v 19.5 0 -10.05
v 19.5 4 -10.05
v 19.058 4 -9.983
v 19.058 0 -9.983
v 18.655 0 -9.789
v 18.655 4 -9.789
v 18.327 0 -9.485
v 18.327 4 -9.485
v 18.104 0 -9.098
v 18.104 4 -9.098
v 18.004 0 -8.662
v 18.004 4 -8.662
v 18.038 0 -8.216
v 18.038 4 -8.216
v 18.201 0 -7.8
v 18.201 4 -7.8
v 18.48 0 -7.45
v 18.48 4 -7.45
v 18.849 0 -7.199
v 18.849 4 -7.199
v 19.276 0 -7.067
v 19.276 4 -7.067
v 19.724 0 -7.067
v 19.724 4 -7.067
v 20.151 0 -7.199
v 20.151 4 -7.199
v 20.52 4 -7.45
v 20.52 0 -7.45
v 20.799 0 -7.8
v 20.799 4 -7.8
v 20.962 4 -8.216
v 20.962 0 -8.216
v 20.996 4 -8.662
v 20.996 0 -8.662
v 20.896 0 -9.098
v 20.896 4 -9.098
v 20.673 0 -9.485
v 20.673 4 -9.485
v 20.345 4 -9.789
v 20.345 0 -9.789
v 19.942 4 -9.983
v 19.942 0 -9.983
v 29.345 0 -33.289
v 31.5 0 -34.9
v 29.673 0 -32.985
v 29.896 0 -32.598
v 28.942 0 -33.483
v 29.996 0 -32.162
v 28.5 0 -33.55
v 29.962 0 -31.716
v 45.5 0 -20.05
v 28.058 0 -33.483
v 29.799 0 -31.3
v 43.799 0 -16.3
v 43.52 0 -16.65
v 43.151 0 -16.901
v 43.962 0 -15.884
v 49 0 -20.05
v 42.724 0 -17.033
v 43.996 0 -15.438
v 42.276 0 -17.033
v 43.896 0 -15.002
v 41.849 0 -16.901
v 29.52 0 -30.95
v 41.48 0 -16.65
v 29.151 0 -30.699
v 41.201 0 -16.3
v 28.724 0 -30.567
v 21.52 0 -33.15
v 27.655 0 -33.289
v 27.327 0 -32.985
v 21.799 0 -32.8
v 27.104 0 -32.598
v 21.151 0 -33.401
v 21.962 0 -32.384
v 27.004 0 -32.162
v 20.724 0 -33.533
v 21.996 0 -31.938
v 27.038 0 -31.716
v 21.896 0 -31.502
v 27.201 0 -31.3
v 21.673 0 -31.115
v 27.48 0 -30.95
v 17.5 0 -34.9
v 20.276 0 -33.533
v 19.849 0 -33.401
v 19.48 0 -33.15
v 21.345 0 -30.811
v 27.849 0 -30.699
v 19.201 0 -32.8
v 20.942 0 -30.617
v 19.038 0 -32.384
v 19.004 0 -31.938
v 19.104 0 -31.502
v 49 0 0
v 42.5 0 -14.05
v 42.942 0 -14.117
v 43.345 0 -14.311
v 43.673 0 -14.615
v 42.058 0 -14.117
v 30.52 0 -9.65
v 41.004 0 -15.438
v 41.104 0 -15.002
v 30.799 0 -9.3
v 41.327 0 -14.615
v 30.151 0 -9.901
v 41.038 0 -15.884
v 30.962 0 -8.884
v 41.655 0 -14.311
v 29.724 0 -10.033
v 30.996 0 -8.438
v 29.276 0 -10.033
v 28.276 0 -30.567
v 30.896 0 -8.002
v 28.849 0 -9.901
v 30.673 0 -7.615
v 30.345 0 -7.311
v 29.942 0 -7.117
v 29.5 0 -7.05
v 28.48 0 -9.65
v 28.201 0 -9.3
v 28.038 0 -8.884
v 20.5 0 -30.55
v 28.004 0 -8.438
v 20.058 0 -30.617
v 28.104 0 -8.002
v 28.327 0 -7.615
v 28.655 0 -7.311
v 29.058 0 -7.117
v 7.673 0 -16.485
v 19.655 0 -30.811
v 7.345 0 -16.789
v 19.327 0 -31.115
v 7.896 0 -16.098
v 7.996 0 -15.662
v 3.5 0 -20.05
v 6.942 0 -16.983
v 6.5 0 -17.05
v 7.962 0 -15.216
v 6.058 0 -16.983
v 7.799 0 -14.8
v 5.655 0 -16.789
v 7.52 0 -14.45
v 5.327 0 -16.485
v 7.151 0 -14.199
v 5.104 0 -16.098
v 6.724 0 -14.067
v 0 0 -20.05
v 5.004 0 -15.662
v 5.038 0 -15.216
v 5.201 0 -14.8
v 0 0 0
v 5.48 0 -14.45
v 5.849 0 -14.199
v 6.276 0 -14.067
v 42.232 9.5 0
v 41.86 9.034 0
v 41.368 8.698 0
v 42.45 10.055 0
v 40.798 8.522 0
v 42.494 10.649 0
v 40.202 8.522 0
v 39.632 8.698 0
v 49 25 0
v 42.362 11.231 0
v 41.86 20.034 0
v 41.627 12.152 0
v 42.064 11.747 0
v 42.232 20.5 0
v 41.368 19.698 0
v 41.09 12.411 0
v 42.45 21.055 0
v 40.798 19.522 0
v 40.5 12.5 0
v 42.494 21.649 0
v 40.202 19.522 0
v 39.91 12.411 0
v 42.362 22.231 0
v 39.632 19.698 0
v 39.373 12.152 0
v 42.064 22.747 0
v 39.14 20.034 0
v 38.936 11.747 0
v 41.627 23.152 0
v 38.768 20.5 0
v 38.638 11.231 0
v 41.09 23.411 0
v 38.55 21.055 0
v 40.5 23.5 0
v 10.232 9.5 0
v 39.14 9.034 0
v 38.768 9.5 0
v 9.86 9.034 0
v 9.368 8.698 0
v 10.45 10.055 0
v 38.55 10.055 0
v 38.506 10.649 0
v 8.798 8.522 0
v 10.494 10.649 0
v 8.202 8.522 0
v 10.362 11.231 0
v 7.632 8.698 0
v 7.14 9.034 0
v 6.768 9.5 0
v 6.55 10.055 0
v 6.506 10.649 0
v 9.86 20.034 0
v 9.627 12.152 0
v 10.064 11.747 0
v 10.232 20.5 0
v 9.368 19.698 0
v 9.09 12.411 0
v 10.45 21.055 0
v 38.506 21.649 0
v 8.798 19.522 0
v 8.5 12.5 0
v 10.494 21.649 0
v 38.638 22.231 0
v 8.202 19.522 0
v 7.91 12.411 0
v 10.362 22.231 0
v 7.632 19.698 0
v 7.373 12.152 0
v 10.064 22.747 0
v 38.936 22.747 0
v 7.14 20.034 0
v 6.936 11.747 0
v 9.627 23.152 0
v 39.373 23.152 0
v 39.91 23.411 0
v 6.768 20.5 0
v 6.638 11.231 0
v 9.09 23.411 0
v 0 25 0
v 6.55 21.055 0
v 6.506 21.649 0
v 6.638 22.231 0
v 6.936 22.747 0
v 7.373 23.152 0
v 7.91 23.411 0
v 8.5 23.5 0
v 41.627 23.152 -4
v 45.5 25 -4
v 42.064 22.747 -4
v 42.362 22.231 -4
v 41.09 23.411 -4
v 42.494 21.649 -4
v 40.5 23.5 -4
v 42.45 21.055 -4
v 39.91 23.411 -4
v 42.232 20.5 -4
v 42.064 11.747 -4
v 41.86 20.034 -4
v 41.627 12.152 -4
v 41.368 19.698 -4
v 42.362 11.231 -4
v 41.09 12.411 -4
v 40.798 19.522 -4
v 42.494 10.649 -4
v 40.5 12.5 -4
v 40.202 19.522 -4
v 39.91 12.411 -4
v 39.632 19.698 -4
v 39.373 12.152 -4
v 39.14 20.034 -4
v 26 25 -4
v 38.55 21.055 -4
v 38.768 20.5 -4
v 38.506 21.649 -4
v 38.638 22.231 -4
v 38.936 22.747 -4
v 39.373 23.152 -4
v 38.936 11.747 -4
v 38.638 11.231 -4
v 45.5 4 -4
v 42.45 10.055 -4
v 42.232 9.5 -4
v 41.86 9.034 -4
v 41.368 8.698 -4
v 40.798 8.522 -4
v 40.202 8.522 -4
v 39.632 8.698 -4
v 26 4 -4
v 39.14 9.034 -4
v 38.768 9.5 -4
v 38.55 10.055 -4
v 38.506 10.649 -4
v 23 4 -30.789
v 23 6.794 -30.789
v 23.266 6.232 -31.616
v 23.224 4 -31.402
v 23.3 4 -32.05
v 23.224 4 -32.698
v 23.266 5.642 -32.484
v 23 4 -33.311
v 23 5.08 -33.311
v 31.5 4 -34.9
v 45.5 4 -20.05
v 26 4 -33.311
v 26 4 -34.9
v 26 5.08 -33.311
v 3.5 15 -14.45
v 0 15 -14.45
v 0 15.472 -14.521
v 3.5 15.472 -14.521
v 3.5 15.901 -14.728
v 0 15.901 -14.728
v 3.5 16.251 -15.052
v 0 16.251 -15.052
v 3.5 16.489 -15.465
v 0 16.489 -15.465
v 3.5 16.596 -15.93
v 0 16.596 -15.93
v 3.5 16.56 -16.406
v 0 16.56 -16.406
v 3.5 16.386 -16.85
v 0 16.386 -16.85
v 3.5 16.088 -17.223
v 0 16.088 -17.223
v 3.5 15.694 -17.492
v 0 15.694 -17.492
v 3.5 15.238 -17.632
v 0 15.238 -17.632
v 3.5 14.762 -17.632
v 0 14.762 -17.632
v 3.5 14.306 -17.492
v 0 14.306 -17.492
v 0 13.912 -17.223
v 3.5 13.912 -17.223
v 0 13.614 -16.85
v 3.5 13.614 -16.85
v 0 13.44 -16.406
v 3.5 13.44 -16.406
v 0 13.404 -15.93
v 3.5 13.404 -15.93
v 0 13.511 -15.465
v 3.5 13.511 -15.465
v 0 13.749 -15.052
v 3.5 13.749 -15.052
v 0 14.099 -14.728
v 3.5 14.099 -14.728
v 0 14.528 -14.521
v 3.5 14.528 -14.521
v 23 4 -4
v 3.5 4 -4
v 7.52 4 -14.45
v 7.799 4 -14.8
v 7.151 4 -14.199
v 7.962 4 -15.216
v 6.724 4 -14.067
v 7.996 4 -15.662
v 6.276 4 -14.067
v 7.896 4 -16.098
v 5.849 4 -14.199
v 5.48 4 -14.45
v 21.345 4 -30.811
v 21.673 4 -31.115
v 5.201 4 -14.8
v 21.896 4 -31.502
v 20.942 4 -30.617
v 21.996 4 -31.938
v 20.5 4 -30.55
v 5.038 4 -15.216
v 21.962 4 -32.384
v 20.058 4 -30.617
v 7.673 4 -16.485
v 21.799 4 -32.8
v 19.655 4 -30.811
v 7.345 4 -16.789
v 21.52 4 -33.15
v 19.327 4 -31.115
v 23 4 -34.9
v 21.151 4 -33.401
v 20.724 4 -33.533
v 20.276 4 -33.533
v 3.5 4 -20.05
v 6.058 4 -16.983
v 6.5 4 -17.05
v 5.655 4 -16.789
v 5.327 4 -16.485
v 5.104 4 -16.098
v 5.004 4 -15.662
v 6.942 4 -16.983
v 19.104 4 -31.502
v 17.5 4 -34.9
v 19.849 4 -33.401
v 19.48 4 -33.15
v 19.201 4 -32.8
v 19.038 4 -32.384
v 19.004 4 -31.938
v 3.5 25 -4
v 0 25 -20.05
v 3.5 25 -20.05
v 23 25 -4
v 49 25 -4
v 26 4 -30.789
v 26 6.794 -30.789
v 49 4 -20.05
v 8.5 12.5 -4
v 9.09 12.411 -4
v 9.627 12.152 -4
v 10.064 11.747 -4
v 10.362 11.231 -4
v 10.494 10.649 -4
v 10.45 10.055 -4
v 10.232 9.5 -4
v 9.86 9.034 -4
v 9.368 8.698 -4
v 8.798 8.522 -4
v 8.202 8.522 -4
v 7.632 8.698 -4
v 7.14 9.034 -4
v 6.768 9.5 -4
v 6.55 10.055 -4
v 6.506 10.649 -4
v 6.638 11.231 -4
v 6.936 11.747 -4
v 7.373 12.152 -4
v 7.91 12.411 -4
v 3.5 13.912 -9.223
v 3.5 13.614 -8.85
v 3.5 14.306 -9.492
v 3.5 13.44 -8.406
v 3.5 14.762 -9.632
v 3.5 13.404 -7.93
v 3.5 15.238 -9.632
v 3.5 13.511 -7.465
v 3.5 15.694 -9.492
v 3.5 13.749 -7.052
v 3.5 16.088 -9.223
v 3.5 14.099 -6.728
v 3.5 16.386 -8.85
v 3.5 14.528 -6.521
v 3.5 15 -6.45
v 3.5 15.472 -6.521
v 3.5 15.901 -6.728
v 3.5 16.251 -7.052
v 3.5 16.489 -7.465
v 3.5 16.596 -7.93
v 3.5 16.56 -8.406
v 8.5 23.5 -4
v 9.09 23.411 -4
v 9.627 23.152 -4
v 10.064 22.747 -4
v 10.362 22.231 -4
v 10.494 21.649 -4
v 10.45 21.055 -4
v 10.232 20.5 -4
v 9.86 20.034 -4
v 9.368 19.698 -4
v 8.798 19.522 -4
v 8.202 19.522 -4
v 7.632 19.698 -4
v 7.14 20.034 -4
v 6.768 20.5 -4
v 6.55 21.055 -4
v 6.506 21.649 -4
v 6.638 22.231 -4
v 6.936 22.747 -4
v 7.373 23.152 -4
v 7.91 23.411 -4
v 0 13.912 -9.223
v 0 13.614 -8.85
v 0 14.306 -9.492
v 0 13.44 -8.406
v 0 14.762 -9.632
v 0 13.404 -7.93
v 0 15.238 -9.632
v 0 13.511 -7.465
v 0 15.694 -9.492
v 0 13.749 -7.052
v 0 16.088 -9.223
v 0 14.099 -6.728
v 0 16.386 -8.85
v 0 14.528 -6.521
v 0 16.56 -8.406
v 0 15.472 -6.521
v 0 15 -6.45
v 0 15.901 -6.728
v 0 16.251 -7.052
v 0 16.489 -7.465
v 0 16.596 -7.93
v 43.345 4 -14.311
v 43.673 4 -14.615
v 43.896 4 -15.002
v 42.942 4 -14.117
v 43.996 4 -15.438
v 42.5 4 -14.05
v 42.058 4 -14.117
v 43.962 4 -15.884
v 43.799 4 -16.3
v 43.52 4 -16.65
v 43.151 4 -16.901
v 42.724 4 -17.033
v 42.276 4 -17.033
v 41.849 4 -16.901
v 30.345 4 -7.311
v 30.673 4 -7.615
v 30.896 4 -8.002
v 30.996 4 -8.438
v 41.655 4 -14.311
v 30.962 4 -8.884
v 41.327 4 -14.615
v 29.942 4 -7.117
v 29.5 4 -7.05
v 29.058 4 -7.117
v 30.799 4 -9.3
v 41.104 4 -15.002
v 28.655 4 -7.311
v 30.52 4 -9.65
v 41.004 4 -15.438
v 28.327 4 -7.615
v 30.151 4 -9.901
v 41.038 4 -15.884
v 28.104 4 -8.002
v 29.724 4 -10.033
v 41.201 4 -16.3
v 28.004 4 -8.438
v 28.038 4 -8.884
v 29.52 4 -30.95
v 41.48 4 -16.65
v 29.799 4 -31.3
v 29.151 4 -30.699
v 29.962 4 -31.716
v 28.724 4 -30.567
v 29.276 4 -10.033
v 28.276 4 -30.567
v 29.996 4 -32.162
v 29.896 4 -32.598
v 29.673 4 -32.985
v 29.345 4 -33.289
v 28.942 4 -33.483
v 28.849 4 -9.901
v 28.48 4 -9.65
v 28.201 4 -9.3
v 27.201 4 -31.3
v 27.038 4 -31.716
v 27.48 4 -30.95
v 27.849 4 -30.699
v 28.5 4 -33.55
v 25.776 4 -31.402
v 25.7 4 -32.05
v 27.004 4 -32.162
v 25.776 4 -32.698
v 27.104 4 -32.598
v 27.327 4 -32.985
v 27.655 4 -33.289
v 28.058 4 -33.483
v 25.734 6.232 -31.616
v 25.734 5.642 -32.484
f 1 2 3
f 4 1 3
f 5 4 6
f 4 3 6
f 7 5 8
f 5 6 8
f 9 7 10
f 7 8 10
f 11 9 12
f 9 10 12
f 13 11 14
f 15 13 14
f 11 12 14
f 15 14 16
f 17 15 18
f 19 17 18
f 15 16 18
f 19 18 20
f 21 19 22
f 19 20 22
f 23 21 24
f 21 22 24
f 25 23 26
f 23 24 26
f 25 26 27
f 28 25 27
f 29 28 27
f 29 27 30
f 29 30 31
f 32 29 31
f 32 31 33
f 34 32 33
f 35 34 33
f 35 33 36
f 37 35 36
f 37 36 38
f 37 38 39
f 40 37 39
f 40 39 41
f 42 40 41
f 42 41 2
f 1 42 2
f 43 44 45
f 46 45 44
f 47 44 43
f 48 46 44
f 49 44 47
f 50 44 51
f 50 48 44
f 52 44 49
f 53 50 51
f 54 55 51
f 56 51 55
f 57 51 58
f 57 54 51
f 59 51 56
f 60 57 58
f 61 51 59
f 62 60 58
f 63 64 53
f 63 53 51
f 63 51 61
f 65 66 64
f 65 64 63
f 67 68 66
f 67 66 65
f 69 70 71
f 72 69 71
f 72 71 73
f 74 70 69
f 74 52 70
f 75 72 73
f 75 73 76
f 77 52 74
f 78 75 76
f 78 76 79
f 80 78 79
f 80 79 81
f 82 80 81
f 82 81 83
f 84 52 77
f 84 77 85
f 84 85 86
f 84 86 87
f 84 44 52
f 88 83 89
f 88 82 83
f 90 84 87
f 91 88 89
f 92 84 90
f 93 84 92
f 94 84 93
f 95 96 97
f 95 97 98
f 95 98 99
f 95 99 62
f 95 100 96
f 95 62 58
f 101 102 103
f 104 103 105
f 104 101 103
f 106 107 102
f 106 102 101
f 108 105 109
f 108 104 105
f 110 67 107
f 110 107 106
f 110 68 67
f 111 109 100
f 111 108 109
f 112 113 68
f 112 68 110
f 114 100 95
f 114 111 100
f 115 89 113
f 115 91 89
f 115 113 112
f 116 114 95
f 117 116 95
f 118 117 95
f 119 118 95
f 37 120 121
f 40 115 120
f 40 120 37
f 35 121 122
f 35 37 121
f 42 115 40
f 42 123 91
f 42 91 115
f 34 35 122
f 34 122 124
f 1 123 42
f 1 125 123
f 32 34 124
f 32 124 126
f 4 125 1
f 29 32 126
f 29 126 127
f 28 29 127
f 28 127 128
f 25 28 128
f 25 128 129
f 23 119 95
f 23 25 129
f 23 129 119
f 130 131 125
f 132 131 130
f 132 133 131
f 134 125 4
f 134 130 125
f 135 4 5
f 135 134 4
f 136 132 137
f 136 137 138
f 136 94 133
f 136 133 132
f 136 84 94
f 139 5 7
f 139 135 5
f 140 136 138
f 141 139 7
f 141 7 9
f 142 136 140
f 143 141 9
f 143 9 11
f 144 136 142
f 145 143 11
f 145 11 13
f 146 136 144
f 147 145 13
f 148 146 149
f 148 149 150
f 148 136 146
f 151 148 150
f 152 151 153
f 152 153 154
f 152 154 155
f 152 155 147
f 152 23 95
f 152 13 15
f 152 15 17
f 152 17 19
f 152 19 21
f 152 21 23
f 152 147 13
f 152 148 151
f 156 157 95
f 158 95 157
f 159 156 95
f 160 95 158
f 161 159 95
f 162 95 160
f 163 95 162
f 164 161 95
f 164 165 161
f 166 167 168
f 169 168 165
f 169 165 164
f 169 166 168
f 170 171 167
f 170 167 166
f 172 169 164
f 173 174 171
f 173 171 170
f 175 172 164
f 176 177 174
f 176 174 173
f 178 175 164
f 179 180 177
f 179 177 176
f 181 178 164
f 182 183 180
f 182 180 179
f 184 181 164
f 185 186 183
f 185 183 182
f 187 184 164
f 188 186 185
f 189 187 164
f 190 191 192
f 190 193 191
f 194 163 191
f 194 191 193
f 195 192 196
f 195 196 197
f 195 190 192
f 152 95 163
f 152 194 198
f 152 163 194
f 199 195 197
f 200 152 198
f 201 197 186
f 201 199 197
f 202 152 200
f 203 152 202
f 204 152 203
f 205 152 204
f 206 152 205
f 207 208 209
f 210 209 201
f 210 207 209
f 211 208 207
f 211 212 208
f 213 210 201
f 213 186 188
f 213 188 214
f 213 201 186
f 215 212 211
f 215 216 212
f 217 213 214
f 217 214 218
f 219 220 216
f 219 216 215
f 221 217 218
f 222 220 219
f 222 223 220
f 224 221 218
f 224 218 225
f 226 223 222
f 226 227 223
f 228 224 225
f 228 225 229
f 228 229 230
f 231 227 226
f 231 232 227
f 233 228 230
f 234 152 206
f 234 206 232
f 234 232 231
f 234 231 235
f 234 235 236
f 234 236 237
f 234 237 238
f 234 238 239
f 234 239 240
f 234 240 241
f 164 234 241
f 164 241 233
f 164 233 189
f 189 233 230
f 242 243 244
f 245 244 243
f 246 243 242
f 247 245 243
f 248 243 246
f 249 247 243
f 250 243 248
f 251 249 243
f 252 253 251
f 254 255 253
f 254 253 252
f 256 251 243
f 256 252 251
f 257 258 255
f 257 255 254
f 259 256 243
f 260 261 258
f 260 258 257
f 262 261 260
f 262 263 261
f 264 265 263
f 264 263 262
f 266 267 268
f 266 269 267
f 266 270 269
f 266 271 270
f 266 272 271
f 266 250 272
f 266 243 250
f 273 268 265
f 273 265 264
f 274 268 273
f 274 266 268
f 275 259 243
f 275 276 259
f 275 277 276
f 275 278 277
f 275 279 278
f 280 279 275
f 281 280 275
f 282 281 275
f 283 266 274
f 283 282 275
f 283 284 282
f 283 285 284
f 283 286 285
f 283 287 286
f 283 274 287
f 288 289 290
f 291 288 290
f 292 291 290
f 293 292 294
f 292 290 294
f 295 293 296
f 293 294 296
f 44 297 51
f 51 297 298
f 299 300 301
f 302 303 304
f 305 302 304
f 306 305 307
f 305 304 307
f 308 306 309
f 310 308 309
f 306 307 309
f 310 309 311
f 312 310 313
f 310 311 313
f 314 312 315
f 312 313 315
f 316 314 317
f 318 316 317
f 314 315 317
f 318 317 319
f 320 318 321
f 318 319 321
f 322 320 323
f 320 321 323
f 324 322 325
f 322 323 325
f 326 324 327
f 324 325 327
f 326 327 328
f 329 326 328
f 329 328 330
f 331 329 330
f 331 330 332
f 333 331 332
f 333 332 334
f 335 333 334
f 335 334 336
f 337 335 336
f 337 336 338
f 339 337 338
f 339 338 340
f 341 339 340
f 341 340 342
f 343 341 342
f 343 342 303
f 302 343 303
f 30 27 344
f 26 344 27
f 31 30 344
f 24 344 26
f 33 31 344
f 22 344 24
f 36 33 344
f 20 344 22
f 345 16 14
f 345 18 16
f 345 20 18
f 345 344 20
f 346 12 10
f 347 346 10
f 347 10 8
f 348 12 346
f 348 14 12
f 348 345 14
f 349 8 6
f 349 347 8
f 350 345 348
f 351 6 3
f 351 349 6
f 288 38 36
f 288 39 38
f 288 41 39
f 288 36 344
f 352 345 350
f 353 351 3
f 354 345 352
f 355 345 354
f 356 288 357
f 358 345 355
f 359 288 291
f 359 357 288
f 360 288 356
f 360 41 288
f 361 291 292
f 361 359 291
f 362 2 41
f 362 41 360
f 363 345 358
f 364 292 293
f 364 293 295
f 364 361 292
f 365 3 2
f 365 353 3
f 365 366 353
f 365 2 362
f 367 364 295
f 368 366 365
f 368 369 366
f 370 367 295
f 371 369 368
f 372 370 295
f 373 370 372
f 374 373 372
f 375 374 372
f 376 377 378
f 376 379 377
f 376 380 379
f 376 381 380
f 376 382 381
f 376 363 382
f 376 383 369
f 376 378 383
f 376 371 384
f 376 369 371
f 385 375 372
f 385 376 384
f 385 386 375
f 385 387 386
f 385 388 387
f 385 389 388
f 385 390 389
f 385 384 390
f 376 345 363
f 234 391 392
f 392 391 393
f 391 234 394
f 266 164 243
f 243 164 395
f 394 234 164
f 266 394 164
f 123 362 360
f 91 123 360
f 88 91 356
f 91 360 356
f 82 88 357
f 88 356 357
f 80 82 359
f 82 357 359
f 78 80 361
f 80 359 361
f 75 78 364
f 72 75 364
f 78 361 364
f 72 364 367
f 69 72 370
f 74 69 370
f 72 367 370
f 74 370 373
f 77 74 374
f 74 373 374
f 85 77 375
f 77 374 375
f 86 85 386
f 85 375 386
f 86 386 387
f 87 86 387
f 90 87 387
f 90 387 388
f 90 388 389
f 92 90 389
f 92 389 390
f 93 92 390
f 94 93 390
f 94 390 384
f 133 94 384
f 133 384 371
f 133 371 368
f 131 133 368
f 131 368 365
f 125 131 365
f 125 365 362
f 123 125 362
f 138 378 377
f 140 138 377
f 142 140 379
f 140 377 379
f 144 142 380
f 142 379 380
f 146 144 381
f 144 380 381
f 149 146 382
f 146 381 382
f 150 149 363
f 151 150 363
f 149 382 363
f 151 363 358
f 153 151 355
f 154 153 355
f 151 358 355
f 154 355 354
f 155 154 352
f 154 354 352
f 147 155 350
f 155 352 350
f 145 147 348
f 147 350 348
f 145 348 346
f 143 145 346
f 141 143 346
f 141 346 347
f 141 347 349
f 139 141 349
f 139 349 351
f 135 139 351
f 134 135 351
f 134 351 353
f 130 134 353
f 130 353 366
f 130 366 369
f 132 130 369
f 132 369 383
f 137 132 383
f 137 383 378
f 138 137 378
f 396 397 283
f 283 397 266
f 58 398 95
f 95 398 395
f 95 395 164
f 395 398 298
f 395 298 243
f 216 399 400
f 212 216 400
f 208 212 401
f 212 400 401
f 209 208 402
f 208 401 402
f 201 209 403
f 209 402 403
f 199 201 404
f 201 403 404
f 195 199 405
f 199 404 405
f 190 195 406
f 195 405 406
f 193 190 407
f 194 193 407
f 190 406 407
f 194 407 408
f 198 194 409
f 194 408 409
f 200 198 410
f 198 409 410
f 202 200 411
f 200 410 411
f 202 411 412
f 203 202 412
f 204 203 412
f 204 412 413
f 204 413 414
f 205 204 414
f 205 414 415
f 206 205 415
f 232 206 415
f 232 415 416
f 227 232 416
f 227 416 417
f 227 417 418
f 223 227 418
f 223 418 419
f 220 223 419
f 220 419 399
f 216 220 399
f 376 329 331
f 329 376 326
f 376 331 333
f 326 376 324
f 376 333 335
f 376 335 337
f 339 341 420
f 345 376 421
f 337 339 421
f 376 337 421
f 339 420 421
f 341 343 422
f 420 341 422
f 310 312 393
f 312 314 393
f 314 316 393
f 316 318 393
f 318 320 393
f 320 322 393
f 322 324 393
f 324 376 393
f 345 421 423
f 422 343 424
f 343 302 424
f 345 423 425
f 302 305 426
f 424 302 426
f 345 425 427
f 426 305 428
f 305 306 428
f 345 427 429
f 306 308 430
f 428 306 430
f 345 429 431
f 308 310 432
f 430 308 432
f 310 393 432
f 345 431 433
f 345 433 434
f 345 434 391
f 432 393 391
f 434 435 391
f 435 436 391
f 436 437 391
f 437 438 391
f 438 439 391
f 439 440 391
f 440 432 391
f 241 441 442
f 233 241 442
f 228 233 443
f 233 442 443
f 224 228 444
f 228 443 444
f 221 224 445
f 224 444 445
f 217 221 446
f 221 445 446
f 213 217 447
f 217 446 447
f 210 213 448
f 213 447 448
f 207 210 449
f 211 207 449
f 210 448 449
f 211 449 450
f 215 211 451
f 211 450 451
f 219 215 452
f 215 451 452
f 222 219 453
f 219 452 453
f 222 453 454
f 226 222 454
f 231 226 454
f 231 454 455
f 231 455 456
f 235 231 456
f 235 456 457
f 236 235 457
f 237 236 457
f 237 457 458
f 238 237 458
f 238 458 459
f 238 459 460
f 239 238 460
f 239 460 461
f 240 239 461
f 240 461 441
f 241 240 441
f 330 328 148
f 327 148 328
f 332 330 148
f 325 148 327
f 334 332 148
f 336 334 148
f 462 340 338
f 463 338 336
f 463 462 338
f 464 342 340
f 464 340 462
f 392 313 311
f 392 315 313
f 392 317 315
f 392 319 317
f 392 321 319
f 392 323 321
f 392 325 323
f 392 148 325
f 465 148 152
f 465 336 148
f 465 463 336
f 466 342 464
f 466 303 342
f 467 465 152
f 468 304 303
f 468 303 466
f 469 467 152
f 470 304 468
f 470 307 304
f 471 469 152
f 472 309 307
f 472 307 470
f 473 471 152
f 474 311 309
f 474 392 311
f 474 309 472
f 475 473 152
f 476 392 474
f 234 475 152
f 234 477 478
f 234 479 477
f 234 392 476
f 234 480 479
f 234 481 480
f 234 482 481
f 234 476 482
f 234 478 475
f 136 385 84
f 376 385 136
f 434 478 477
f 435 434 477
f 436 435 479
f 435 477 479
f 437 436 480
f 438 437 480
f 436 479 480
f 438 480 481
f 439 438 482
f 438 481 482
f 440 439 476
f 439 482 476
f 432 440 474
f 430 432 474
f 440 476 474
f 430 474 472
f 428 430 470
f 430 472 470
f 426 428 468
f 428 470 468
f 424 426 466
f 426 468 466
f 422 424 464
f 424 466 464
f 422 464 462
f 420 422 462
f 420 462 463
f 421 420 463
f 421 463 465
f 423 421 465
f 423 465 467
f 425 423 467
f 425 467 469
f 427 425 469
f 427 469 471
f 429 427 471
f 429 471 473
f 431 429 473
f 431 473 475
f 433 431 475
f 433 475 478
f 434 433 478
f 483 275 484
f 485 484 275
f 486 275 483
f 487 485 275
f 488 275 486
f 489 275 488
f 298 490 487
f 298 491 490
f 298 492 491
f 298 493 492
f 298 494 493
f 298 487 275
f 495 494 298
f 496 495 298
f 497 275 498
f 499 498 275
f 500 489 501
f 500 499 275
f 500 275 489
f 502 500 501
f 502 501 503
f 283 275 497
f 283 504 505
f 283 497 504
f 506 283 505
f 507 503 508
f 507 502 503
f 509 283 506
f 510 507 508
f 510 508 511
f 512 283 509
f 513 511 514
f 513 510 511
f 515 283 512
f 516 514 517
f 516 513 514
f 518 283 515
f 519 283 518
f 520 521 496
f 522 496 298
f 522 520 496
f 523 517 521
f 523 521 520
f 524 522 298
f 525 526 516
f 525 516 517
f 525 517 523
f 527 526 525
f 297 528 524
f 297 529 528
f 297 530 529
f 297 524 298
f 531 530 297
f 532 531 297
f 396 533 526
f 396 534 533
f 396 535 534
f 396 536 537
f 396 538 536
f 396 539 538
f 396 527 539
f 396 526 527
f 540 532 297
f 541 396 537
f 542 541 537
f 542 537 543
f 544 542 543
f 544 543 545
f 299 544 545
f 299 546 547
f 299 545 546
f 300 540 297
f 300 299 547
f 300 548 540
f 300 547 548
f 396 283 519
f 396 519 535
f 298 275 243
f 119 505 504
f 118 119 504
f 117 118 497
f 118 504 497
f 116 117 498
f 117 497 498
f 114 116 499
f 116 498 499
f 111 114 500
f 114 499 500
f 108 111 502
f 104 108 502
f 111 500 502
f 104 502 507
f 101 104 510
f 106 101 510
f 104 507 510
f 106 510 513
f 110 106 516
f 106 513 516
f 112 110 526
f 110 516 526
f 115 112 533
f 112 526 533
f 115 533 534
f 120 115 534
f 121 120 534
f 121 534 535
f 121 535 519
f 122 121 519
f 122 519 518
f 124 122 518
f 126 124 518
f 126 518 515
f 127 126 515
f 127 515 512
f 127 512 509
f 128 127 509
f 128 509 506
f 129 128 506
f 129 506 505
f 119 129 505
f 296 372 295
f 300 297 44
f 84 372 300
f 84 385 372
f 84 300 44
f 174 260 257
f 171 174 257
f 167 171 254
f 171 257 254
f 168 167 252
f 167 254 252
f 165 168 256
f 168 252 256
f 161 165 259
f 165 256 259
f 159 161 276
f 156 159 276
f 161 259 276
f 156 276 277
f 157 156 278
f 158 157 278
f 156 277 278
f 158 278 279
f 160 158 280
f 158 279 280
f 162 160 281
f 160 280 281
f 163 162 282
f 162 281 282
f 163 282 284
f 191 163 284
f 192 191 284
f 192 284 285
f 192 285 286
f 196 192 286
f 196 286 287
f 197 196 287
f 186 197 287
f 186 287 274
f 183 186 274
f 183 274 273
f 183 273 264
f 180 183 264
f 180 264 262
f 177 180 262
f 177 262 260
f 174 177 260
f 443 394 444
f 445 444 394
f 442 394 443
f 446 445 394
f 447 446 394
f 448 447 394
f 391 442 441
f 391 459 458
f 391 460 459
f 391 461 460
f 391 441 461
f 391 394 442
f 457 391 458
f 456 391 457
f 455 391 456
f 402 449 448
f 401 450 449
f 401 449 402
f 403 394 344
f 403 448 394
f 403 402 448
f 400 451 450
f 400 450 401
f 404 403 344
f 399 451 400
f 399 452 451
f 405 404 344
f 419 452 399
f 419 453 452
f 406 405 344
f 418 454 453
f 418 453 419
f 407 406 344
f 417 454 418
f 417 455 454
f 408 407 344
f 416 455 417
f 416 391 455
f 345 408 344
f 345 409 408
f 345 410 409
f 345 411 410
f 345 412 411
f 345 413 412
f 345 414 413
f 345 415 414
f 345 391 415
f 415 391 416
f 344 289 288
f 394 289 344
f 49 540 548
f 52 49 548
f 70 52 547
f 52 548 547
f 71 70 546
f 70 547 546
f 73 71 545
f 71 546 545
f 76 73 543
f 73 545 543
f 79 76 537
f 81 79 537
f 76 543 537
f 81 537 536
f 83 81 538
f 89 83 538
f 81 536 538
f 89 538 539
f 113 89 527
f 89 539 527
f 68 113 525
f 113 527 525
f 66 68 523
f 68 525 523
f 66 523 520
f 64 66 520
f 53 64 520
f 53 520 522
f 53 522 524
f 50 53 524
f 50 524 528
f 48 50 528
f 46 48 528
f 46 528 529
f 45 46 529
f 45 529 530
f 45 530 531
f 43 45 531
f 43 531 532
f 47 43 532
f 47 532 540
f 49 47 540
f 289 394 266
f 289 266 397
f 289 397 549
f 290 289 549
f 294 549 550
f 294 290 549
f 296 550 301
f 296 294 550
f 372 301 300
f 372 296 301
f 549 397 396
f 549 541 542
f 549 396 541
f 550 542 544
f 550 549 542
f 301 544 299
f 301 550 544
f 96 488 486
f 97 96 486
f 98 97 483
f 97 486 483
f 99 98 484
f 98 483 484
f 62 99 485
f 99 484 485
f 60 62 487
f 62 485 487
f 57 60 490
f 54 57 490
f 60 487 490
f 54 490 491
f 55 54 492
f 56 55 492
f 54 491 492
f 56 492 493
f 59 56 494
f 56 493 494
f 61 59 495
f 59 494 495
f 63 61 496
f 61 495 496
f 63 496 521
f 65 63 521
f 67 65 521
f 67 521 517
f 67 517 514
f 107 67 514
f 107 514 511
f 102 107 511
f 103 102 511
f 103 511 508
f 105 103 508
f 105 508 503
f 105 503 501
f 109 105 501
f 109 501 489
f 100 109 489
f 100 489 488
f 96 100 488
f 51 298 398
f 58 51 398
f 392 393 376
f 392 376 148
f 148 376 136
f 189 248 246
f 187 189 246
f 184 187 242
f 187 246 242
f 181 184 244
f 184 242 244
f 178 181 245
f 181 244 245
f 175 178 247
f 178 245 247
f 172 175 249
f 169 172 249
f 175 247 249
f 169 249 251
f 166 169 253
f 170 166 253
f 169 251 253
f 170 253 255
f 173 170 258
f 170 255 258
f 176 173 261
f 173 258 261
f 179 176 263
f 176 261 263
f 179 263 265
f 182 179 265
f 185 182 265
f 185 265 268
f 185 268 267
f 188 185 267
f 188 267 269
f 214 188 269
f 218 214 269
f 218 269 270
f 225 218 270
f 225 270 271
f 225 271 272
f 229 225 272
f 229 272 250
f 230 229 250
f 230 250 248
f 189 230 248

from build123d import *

# Parameters (mm, degrees)
EXTRUDE_1_DEPTH      = 49
SKETCH_3_R           = 1.5
CUT_EXTRUDE_1_DEPTH  = 64.718207759
EXTRUDE_3_DEPTH      = 3.5
EXTRUDE_4_DEPTH      = 3.5
EXTRUDE_5_DEPTH      = 1.5
EXTRUDE_5_DEPTH_BACK = 1.5
SKETCH_8_R           = 2
CUT_EXTRUDE_2_DEPTH  = 10
CUT_EXTRUDE_3_REACH  = 67.146
EXTRUDE_6_DEPTH      = 3.5
SKETCH_11_R          = 1.6
CUT_EXTRUDE_4_DEPTH  = 10


with BuildPart() as part:
    # 草图1 → 凸台-拉伸1 (new body)
    with BuildSketch(Plane(origin=(0, 0, 0), x_dir=(0, 0, -1), z_dir=(1, 0, 0))):
        Polygon((0, 0), (0, 25), (4, 25), (4, 4), (34.9, 4), (34.9, 0), align=None)
    extrude(amount=EXTRUDE_1_DEPTH)

    # 草图3 → 切除-拉伸1 (cut, through all)
    with BuildSketch(Plane(origin=(0, 4, 0), x_dir=(1, 0, 0), z_dir=(0, 1, 0))):
        with Locations(Location((20.5, 32.05, 0), (0, 0, 270))):
            Circle(SKETCH_3_R)
        with Locations(Location((28.5, 32.05, 0), (0, 0, 90))):
            Circle(SKETCH_3_R)
        with Locations(Location((42.5, 15.55, 0), (0, 0, 270))):
            Circle(SKETCH_3_R)
        with Locations(Location((6.5, 15.55, 0), (0, 0, 90))):
            Circle(SKETCH_3_R)
        with Locations(Location((29.5, 8.55, 0), (0, 0, 270))):
            Circle(SKETCH_3_R)
        with Locations(Location((19.5, 8.55, 0), (0, 0, 90))):
            Circle(SKETCH_3_R)
        Polygon((31.5, 34.9), (45.5, 20.05), (49, 20.05), (49, 34.9), align=None)
        Polygon((0, 20.05), (0, 34.9), (17.5, 34.9), (3.5, 20.05), align=None)
    extrude(amount=-CUT_EXTRUDE_1_DEPTH, mode=Mode.SUBTRACT)

    # 草图5 → 凸台-拉伸3 (add)
    with BuildSketch(Plane(origin=(49, 0, 0), x_dir=(0, 0, -1), z_dir=(1, 0, 0))):
        Polygon((20.05, 0), (20.05, 4), (4, 25), (0, 25), (0, 0), align=None)
    extrude(amount=-EXTRUDE_3_DEPTH)

    # 草图6 → 凸台-拉伸4 (add)
    with BuildSketch(Plane.ZY):
        Polygon((-4, 25), (0, 25), (0, 0), (-20.05, 0), (-20.05, 4), align=None)
    extrude(amount=-EXTRUDE_4_DEPTH)

    # 草图7 → 凸台-拉伸5 (add, two sides: drawn at the far end of the back side and taken through both)
    with BuildSketch(Plane(origin=(24.5, 0, 0), x_dir=(0, 0, -1), z_dir=(1, 0, 0)).offset(-EXTRUDE_5_DEPTH_BACK)):
        Polygon((34.9, 4), (34.9, 0), (0, 0), (0, 25), (4, 25), align=None)
    extrude(amount=EXTRUDE_5_DEPTH + EXTRUDE_5_DEPTH_BACK)

    # 草图8 → 切除-拉伸2 (cut)
    with BuildSketch(Plane(origin=(0, 0, -4), x_dir=(-1, 0, 0), z_dir=(0, 0, -1))):
        with Locations(Location((-8.5, 21.5, 0), (0, 0, 90))):
            Circle(SKETCH_8_R)
        with Locations(Location((-8.5, 10.5, 0), (0, 0, 90))):
            Circle(SKETCH_8_R)
        with Locations(Location((-40.5, 10.5, 0), (0, 0, 90))):
            Circle(SKETCH_8_R)
        with Locations(Location((-40.5, 21.5, 0), (0, 0, 90))):
            Circle(SKETCH_8_R)
    extrude(amount=-CUT_EXTRUDE_2_DEPTH, mode=Mode.SUBTRACT)

    # 切除-拉伸3: up to this face of the body (flat: up to its plane)
    cut_extrude_3_end = Plane(part.part.faces().sort_by_distance((34.743076347, 4, -17.196256648))[0])
    # 草图9 → 切除-拉伸3 (cut, up to the picked face)
    with BuildSketch(Plane(origin=(0, 25, 0), x_dir=(1, 0, 0), z_dir=(0, 1, 0)), mode=Mode.PRIVATE) as cut_extrude_3_sk1:
        with BuildLine():
            Line((26, 33.310952021), (26, 30.789047979))
            ThreePointArc((26, 30.789047979), (25.7, 32.05), (26, 33.310952021))
        make_face()
    cut_extrude_3_tool1 = split(extrude(cut_extrude_3_sk1.sketch, amount=-CUT_EXTRUDE_3_REACH, mode=Mode.PRIVATE), bisect_by=cut_extrude_3_end, keep=Keep.BOTH, mode=Mode.PRIVATE)
    # 草图9 → 切除-拉伸3 (cut, up to the picked face)
    with BuildSketch(Plane(origin=(0, 25, 0), x_dir=(1, 0, 0), z_dir=(0, 1, 0)), mode=Mode.PRIVATE) as cut_extrude_3_sk2:
        with BuildLine():
            Line((23, 33.310952021), (23, 30.789047979))
            ThreePointArc((23, 30.789047979), (23.3, 32.05), (23, 33.310952021))
        make_face()
    cut_extrude_3_tool2 = split(extrude(cut_extrude_3_sk2.sketch, amount=-CUT_EXTRUDE_3_REACH, mode=Mode.PRIVATE), bisect_by=cut_extrude_3_end, keep=Keep.BOTH, mode=Mode.PRIVATE)
    add(cut_extrude_3_tool1.solids().sort_by(Axis((25.879431, 25, -32.05), (0, -1, 0)))[0], mode=Mode.SUBTRACT)
    add(cut_extrude_3_tool2.solids().sort_by(Axis((23.120569, 25, -32.05), (0, -1, 0)))[0], mode=Mode.SUBTRACT)

    # 草图10 → 凸台-拉伸6 (add)
    with BuildSketch(Plane(origin=(3.5, 0, 0), x_dir=(0, 0, -1), z_dir=(1, 0, 0))):
        Polygon((20.05, 4), (4, 25), (20.05, 25), align=None)
    extrude(amount=-EXTRUDE_6_DEPTH)

    # 草图11 → 切除-拉伸4 (cut)
    with BuildSketch(Plane.ZY):
        with Locations((-8.05, 15)):
            Circle(SKETCH_11_R)
        with Locations((-16.05, 15)):
            Circle(SKETCH_11_R)
    extrude(amount=-CUT_EXTRUDE_4_DEPTH, mode=Mode.SUBTRACT)


solid = part.part
